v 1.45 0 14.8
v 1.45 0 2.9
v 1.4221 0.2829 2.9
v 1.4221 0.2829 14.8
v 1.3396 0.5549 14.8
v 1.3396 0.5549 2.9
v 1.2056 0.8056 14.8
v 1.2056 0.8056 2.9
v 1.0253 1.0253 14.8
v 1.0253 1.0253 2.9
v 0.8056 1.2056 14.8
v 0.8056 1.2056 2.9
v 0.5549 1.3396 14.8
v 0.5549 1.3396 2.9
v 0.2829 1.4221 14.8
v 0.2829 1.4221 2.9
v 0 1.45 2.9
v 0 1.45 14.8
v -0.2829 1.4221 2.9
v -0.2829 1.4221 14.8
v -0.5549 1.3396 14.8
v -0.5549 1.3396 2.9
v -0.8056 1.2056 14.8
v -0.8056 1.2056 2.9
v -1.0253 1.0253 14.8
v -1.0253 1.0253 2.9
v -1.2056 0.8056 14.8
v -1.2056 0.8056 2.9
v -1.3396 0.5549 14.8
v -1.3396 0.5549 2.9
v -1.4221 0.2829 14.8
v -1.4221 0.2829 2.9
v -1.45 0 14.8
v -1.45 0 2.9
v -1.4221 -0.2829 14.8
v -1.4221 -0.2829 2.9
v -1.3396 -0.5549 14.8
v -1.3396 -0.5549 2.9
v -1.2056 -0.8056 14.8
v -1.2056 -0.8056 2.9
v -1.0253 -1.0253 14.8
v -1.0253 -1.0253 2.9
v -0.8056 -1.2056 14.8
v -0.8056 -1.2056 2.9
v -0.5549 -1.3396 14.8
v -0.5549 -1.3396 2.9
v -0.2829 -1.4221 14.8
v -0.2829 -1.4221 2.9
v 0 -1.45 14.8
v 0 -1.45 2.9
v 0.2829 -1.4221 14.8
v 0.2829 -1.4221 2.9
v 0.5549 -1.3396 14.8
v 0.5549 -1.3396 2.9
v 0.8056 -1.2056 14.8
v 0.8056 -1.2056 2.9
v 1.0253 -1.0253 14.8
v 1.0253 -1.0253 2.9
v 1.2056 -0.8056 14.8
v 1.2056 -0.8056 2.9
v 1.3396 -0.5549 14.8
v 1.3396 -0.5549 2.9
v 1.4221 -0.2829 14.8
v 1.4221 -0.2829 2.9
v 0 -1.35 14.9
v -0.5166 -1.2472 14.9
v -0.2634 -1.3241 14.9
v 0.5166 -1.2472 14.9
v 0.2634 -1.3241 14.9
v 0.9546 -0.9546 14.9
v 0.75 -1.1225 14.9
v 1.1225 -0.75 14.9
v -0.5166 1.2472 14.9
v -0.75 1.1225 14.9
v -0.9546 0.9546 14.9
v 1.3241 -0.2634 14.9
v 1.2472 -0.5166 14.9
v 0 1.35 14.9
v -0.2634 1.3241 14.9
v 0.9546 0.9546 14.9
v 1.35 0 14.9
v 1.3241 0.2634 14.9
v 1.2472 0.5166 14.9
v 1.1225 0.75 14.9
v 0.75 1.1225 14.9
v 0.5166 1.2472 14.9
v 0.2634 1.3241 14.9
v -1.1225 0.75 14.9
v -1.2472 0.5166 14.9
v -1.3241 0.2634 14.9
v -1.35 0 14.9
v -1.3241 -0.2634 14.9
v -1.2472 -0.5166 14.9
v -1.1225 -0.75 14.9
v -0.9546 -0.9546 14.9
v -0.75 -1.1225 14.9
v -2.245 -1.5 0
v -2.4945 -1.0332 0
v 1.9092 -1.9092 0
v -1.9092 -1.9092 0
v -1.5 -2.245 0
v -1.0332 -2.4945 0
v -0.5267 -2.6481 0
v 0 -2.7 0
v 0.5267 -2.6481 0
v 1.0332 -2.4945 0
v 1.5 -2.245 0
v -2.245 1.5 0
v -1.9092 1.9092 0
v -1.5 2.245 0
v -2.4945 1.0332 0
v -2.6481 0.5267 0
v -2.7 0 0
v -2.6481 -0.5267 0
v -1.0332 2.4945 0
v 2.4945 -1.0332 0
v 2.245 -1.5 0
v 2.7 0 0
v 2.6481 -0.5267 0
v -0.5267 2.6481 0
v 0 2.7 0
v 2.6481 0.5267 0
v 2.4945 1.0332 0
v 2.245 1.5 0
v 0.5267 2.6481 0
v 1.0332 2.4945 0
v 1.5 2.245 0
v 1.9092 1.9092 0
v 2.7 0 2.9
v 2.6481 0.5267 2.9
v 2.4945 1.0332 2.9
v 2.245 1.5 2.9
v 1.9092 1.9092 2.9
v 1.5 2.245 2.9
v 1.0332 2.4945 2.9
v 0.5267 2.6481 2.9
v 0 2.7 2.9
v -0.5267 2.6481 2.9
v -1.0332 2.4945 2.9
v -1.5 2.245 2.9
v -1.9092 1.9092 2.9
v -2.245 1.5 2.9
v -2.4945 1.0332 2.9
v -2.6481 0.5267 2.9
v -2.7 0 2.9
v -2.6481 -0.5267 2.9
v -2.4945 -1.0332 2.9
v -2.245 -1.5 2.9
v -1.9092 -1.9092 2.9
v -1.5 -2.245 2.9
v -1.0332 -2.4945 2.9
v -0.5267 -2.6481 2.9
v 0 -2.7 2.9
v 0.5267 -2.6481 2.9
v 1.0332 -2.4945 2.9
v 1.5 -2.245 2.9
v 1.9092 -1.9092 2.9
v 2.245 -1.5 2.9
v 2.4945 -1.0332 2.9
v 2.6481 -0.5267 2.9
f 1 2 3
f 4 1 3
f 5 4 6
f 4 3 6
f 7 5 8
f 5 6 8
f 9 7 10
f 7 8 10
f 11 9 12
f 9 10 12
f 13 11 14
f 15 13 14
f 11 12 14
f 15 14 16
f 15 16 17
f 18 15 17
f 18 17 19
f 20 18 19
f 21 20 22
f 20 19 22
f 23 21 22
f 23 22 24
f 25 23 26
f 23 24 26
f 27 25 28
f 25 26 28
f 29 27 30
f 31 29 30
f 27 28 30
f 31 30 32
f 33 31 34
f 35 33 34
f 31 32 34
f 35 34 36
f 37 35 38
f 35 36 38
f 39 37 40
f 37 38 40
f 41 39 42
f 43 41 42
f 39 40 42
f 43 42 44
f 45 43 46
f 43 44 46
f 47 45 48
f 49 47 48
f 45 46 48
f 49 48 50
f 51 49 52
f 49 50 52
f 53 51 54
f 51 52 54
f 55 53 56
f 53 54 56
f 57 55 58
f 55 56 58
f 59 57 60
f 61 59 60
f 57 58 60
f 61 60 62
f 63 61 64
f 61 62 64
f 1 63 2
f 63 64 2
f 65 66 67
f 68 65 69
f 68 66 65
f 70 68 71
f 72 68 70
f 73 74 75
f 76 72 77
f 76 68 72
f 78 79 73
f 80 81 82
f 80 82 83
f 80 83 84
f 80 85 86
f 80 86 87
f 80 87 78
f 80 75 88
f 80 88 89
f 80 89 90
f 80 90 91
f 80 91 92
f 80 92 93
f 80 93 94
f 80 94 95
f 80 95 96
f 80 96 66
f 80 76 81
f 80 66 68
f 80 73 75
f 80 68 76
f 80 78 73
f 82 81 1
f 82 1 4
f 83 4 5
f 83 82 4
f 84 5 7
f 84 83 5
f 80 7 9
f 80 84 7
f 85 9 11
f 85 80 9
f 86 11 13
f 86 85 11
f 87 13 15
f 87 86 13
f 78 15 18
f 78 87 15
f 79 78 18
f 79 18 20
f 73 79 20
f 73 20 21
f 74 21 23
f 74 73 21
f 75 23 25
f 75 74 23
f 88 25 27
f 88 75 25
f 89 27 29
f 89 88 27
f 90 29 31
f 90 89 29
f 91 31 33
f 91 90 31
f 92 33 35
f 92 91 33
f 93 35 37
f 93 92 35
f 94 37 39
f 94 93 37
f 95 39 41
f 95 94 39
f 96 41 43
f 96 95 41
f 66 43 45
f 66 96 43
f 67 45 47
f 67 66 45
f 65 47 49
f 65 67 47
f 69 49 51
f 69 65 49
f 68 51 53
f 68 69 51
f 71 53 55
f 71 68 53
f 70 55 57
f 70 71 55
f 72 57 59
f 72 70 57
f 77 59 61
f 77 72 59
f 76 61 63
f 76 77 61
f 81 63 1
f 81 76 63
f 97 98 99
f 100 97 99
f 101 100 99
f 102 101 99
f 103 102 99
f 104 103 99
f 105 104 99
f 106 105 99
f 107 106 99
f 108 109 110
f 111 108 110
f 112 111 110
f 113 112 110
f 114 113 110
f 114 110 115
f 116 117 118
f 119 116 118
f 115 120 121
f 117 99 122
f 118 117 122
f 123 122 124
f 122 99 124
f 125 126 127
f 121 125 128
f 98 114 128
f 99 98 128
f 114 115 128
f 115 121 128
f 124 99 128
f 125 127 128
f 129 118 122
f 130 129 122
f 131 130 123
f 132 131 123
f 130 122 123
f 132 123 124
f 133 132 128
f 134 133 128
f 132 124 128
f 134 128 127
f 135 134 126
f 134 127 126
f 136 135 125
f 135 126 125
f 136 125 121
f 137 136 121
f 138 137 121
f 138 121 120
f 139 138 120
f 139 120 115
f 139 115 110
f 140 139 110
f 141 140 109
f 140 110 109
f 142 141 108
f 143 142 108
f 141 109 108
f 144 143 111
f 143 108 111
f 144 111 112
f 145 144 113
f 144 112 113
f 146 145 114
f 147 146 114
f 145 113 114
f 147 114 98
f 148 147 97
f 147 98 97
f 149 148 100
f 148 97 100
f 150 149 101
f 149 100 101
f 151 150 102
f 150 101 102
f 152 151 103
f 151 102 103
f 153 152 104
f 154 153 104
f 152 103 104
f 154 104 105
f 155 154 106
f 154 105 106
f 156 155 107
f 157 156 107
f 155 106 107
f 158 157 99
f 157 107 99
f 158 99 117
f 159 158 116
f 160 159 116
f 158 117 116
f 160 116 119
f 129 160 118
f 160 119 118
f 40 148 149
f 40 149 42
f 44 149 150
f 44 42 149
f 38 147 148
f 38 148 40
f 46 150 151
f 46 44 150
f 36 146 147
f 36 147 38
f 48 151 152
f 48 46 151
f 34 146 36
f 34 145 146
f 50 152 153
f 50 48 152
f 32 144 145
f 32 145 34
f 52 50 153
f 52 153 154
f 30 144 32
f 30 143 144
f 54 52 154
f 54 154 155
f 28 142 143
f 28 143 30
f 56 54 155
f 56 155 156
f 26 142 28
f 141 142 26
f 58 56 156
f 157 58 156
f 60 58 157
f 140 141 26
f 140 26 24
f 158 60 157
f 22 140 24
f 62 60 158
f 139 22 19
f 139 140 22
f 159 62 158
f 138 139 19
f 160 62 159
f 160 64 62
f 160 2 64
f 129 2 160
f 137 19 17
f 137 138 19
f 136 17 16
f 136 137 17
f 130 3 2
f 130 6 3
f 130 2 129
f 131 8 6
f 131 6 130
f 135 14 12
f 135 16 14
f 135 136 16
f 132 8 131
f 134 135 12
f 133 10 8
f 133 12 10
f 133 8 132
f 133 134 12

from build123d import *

# Parameters (mm, degrees)
SKIZZE1_R                       = 2.7
AUFSATZ_LINEAR_AUSTRAGEN2_DEPTH = 2.9
SKIZZE3_R                       = 1.45
AUFSATZ_LINEAR_AUSTRAGEN3_DEPTH = 12
FASE1_SIZE                      = 0.1


with BuildPart() as part:
    # Skizze1 → Aufsatz-Linear austragen2 (new body)
    with BuildSketch(Plane.XY):
        Circle(SKIZZE1_R)
    extrude(amount=AUFSATZ_LINEAR_AUSTRAGEN2_DEPTH)

    # Skizze3 → Aufsatz-Linear austragen3 (add)
    with BuildSketch(Plane.XY.offset(2.9)):
        Circle(SKIZZE3_R)
    extrude(amount=AUFSATZ_LINEAR_AUSTRAGEN3_DEPTH)

    # Fase1
    fase1_edges = [part.edges().sort_by_distance(p)[0] for p in [
        (-1.45, 0, 14.9),
    ]]
    chamfer(fase1_edges, length=FASE1_SIZE)


solid = part.part
